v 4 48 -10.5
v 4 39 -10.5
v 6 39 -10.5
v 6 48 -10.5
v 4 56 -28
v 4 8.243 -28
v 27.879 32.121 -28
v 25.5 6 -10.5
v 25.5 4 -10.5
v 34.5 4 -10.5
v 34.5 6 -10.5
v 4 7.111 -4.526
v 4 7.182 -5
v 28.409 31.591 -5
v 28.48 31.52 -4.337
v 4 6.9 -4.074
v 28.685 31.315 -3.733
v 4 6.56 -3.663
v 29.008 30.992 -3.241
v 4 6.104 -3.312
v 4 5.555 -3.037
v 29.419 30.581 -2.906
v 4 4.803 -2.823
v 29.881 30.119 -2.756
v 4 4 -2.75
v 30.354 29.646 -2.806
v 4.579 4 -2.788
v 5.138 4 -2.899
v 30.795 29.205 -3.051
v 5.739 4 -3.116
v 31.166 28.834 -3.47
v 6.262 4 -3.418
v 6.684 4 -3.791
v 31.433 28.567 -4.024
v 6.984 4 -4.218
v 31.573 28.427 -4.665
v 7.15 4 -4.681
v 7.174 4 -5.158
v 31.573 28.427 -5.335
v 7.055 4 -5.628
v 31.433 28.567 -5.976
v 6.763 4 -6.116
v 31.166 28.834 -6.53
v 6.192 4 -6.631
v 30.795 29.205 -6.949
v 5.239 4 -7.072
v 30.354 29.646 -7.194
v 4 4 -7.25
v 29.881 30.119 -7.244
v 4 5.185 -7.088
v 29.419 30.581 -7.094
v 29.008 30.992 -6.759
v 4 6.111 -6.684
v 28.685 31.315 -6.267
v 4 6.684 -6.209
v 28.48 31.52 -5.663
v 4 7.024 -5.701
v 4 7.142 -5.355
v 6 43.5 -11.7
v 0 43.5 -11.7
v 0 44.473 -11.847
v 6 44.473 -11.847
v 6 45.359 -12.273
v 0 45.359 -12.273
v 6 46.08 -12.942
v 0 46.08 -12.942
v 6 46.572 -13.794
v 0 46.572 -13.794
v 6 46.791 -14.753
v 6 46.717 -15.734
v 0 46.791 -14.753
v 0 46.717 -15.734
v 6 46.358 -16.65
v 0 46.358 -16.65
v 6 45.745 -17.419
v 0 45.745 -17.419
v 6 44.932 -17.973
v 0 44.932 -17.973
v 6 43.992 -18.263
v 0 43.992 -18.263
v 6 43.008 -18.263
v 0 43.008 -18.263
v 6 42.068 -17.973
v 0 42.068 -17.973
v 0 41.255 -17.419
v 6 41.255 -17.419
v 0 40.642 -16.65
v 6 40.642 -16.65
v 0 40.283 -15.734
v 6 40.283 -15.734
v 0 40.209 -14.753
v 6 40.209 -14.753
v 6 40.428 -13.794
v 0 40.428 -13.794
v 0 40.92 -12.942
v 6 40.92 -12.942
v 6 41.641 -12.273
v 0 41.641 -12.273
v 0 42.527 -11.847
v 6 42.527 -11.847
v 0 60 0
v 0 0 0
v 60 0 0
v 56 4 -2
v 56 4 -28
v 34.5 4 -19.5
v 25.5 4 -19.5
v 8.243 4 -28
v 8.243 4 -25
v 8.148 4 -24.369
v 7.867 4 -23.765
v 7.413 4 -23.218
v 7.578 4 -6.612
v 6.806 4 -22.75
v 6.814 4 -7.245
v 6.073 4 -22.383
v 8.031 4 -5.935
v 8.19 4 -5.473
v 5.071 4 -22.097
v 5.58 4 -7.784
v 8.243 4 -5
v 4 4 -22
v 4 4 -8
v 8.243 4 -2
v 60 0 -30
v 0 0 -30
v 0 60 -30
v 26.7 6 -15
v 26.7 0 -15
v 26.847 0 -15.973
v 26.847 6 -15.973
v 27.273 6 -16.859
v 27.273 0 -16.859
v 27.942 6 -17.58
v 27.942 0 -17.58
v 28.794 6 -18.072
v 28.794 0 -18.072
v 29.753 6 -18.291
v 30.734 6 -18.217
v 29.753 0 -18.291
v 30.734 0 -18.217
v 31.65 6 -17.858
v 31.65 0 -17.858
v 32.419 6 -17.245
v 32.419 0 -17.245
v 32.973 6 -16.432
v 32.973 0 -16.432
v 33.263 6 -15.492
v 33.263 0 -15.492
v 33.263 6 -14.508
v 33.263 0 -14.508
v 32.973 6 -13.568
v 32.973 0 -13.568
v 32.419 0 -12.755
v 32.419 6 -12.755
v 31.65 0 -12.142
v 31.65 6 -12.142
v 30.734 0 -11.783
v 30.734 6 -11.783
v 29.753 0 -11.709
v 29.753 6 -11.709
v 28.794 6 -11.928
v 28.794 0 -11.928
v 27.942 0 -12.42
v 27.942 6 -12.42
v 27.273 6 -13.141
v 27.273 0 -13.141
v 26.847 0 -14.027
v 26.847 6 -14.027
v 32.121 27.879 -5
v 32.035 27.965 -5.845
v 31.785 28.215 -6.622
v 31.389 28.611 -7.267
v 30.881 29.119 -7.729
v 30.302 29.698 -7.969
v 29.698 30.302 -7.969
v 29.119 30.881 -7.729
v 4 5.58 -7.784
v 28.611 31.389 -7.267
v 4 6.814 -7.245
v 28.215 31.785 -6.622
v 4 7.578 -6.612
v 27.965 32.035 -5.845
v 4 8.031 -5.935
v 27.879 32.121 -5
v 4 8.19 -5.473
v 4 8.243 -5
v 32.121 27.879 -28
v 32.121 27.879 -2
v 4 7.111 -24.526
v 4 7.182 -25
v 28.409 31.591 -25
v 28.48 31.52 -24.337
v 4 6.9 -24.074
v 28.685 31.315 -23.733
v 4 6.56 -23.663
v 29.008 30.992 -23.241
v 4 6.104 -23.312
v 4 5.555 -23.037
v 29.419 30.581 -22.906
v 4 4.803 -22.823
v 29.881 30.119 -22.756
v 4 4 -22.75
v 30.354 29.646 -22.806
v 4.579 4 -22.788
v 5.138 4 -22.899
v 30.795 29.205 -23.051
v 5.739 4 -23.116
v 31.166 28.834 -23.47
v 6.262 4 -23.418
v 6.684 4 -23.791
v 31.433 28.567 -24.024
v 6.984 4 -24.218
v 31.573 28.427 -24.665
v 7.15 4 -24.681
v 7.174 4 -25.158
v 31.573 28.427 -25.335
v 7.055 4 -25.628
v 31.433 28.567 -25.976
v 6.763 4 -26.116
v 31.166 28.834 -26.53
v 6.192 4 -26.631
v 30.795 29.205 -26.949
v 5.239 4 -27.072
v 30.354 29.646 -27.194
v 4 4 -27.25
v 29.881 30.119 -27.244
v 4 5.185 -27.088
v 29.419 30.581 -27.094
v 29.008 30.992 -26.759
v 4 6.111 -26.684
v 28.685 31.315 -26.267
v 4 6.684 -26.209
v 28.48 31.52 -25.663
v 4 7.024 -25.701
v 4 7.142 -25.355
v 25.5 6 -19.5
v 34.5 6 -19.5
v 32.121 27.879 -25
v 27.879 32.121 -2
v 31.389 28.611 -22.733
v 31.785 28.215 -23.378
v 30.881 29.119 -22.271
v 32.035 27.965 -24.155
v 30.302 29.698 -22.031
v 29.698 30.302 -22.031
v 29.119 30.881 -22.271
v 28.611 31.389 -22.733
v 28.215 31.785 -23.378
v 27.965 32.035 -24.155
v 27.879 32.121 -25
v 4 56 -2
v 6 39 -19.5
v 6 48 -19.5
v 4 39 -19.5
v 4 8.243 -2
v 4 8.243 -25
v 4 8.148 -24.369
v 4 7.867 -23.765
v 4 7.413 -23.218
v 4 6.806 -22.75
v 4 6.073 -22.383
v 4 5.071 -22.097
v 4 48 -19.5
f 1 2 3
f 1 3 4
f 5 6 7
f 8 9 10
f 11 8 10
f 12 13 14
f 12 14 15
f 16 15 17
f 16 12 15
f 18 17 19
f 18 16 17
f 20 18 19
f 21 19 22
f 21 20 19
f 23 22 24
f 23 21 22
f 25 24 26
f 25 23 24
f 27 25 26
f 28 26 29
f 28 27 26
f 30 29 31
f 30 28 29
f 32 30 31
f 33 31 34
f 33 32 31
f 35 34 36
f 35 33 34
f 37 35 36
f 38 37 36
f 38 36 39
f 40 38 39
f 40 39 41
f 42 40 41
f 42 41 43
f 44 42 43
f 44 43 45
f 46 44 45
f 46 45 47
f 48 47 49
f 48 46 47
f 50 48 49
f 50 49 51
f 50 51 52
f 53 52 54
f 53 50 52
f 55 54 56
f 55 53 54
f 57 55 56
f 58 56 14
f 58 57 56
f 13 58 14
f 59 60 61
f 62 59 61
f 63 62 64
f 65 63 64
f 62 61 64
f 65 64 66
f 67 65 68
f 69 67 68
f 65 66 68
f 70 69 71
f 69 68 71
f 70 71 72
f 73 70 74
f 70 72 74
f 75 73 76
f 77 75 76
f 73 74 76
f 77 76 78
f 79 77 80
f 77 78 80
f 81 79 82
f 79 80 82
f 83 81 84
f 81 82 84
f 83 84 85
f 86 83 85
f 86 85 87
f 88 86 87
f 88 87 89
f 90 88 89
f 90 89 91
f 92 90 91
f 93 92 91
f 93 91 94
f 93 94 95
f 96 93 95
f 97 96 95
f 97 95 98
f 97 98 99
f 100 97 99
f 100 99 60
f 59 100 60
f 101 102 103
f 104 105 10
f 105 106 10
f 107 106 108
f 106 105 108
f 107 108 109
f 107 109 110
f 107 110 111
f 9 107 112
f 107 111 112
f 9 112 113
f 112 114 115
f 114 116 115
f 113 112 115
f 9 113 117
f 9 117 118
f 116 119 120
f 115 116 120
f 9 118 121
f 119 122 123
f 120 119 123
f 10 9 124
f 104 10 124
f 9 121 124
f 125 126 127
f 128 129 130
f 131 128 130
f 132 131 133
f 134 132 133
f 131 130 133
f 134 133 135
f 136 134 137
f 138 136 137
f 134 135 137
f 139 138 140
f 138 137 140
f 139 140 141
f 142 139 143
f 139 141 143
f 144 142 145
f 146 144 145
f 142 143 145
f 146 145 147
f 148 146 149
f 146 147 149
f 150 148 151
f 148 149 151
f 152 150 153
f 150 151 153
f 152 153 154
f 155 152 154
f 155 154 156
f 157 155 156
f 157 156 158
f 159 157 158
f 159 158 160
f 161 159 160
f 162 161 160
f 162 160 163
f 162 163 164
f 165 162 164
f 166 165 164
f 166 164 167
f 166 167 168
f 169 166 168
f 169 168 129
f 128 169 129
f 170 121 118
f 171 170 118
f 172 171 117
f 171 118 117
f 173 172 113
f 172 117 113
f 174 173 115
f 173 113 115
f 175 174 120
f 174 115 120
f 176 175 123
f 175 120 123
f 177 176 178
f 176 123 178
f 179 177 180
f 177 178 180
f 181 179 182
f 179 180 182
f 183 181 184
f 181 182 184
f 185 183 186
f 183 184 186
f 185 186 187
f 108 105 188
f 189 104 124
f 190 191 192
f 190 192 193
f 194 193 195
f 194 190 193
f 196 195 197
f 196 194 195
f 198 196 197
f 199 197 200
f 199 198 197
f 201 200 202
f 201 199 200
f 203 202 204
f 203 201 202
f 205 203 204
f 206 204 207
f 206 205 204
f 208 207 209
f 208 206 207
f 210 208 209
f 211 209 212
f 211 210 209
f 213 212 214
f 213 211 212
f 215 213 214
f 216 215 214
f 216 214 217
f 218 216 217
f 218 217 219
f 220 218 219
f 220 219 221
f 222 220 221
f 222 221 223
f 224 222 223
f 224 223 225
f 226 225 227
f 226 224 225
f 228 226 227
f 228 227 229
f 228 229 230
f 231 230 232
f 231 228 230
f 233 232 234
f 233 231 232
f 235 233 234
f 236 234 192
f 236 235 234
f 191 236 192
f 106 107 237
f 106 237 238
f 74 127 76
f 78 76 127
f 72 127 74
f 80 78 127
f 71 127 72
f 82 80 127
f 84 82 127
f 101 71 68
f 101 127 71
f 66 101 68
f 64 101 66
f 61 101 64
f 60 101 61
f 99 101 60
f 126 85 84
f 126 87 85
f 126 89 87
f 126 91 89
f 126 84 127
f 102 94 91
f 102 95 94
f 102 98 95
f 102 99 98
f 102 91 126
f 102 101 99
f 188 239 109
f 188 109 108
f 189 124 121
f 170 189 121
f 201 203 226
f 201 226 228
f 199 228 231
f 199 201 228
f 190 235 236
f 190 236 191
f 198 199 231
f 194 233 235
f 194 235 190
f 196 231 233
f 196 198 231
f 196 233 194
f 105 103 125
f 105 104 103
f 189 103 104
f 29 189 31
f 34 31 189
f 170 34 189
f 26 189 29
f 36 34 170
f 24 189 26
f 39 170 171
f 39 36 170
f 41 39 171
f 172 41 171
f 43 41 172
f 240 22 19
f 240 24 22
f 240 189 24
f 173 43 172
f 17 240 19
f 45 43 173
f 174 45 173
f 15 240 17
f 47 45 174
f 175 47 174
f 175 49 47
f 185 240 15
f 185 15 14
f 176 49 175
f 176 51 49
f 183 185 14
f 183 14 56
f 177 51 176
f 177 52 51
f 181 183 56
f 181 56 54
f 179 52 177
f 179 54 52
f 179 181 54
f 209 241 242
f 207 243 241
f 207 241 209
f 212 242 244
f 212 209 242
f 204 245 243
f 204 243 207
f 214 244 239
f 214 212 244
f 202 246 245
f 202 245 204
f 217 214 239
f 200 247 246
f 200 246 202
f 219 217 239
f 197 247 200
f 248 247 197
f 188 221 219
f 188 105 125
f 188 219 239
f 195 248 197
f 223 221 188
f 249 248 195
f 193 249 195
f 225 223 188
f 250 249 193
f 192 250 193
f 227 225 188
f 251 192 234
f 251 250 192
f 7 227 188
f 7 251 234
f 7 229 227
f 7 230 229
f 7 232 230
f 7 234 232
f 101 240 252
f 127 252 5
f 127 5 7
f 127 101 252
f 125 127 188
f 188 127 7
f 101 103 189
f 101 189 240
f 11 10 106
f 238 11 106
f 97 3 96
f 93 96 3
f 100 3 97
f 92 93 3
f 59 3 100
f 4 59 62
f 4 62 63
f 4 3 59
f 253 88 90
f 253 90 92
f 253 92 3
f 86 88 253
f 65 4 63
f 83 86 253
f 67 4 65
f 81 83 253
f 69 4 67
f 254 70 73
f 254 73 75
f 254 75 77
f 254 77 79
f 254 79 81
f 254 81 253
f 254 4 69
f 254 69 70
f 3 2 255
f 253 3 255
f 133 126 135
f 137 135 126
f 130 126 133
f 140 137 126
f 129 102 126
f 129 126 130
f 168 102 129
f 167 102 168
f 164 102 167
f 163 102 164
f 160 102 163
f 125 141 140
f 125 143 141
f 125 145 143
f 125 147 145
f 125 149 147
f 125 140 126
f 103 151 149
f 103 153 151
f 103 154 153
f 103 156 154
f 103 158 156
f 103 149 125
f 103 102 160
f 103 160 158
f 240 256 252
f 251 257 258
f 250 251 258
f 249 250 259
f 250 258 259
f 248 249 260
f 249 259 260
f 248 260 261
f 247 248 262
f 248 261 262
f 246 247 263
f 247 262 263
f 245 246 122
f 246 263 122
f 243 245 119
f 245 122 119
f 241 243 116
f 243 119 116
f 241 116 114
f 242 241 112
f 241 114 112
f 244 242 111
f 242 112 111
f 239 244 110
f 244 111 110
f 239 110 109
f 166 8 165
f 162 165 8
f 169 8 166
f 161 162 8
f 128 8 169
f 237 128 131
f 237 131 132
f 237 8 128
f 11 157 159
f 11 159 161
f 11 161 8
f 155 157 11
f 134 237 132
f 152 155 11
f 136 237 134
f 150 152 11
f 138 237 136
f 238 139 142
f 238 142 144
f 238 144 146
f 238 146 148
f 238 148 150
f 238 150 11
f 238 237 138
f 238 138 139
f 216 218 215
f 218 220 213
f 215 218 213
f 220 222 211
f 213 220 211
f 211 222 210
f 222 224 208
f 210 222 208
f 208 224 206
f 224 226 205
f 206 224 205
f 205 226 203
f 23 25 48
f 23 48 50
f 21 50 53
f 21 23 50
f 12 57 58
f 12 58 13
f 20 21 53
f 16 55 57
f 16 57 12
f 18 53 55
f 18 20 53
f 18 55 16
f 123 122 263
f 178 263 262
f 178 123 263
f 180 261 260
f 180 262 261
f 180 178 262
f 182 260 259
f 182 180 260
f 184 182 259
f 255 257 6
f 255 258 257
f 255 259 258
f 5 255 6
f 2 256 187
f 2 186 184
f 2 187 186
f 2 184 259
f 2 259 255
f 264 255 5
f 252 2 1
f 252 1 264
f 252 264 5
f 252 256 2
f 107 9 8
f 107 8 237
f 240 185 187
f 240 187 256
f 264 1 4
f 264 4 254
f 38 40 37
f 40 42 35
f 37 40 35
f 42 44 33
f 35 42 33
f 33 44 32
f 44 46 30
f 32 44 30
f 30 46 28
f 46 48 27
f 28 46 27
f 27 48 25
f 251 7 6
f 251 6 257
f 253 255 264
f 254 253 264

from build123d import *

# Parameters (mm, degrees)
BOSS_EXTRUDE1_DEPTH  = 30
SHELL1_START         = 4
SHELL1_OUTLINE_W     = 57
SHELL1_OUTLINE_H     = 26
SHELL1_DEPTH         = 52
SKETCH2_W            = 9
SKETCH2_H            = 9
BOSS_EXTRUDE2_DEPTH  = 2
SKETCH3_W            = 9
SKETCH3_H            = 9
BOSS_EXTRUDE3_DEPTH  = 2
BOSS_EXTRUDE4_START  = -36.769553
SKETCH4_R            = 2.25
BOSS_EXTRUDE4_DEPTH  = 36.769553
M6_CLEARANCE_HOLE2_D = 6.6
M6_CLEARANCE_HOLE3_D = 6.6


# Read off the part's stored shape, not the designer's step: Shell1
with BuildPart() as part:
    # Sketch1 → Boss-Extrude1 (new body)
    with BuildSketch(Plane.XY):
        Polygon((0, 0), (60, 0), (0, 60), align=None)
    extrude(amount=-BOSS_EXTRUDE1_DEPTH)

    # Shell1 outline → Shell1 (cut)
    with BuildSketch(Plane.YZ.offset(SHELL1_START)):
        with Locations((32.5, -15)):
            Rectangle(SHELL1_OUTLINE_W, SHELL1_OUTLINE_H)
    extrude(amount=SHELL1_DEPTH, mode=Mode.SUBTRACT)

    # Sketch2 → Boss-Extrude2 (add)
    with BuildSketch(Plane(origin=(0, 4, 0), x_dir=(1, 0, 0), z_dir=(0, 1, 0))):
        with Locations((30, 15)):
            Rectangle(SKETCH2_W, SKETCH2_H)
    extrude(amount=BOSS_EXTRUDE2_DEPTH)

    # Sketch3 → Boss-Extrude3 (add)
    with BuildSketch(Plane(origin=(4, 0, 0), x_dir=(0, 0, -1), z_dir=(1, 0, 0))):
        with Locations((15, 43.5)):
            Rectangle(SKETCH3_W, SKETCH3_H)
    extrude(amount=BOSS_EXTRUDE3_DEPTH)

    # Sketch4 → Boss-Extrude4 (add)
    # profile 1 of 2: a face of its own
    with BuildSketch(Plane(origin=(30, 30, 0), x_dir=(0, 0, -1), z_dir=(0.7071067811865477, 0.7071067811865475, 0)).offset(BOSS_EXTRUDE4_START)):
        with BuildLine():
            Line((2, 3), (2, -3))
            Line((2, -3), (5, -3))
            ThreePointArc((5, -3), (8, 0), (5, 3))
            Line((5, 3), (2, 3))
        make_face()
        with Locations(Location((5, 0, 0), (0, 0, 90))):
            Circle(SKETCH4_R, mode=Mode.SUBTRACT)
    # profile 2 of 2: a face of its own
    with BuildSketch(Plane(origin=(30, 30, 0), x_dir=(0, 0, -1), z_dir=(0.7071067811865477, 0.7071067811865475, 0)).offset(BOSS_EXTRUDE4_START)):
        with BuildLine():
            Line((25, -3), (28, -3))
            Line((28, -3), (28, 3))
            Line((28, 3), (25, 3))
            ThreePointArc((25, 3), (22, 0), (25, -3))
        make_face()
        with Locations(Location((25, 0, 0), (0, 0, 90))):
            Circle(SKETCH4_R, mode=Mode.SUBTRACT)
    extrude(amount=BOSS_EXTRUDE4_DEPTH)

    # M6 Clearance Hole2 (through all)
    with Locations(Plane(origin=(0, 6, 0), x_dir=(1, 0, 0), z_dir=(0, 1, 0))):
        with Locations((30, 15)):
            Hole(M6_CLEARANCE_HOLE2_D / 2)

    # M6 Clearance Hole3 (through all)
    with Locations(Plane(origin=(6, 0, 0), x_dir=(0, 0, -1), z_dir=(1, 0, 0))):
        with Locations((15, 43.5)):
            Hole(M6_CLEARANCE_HOLE3_D / 2)


solid = part.part
